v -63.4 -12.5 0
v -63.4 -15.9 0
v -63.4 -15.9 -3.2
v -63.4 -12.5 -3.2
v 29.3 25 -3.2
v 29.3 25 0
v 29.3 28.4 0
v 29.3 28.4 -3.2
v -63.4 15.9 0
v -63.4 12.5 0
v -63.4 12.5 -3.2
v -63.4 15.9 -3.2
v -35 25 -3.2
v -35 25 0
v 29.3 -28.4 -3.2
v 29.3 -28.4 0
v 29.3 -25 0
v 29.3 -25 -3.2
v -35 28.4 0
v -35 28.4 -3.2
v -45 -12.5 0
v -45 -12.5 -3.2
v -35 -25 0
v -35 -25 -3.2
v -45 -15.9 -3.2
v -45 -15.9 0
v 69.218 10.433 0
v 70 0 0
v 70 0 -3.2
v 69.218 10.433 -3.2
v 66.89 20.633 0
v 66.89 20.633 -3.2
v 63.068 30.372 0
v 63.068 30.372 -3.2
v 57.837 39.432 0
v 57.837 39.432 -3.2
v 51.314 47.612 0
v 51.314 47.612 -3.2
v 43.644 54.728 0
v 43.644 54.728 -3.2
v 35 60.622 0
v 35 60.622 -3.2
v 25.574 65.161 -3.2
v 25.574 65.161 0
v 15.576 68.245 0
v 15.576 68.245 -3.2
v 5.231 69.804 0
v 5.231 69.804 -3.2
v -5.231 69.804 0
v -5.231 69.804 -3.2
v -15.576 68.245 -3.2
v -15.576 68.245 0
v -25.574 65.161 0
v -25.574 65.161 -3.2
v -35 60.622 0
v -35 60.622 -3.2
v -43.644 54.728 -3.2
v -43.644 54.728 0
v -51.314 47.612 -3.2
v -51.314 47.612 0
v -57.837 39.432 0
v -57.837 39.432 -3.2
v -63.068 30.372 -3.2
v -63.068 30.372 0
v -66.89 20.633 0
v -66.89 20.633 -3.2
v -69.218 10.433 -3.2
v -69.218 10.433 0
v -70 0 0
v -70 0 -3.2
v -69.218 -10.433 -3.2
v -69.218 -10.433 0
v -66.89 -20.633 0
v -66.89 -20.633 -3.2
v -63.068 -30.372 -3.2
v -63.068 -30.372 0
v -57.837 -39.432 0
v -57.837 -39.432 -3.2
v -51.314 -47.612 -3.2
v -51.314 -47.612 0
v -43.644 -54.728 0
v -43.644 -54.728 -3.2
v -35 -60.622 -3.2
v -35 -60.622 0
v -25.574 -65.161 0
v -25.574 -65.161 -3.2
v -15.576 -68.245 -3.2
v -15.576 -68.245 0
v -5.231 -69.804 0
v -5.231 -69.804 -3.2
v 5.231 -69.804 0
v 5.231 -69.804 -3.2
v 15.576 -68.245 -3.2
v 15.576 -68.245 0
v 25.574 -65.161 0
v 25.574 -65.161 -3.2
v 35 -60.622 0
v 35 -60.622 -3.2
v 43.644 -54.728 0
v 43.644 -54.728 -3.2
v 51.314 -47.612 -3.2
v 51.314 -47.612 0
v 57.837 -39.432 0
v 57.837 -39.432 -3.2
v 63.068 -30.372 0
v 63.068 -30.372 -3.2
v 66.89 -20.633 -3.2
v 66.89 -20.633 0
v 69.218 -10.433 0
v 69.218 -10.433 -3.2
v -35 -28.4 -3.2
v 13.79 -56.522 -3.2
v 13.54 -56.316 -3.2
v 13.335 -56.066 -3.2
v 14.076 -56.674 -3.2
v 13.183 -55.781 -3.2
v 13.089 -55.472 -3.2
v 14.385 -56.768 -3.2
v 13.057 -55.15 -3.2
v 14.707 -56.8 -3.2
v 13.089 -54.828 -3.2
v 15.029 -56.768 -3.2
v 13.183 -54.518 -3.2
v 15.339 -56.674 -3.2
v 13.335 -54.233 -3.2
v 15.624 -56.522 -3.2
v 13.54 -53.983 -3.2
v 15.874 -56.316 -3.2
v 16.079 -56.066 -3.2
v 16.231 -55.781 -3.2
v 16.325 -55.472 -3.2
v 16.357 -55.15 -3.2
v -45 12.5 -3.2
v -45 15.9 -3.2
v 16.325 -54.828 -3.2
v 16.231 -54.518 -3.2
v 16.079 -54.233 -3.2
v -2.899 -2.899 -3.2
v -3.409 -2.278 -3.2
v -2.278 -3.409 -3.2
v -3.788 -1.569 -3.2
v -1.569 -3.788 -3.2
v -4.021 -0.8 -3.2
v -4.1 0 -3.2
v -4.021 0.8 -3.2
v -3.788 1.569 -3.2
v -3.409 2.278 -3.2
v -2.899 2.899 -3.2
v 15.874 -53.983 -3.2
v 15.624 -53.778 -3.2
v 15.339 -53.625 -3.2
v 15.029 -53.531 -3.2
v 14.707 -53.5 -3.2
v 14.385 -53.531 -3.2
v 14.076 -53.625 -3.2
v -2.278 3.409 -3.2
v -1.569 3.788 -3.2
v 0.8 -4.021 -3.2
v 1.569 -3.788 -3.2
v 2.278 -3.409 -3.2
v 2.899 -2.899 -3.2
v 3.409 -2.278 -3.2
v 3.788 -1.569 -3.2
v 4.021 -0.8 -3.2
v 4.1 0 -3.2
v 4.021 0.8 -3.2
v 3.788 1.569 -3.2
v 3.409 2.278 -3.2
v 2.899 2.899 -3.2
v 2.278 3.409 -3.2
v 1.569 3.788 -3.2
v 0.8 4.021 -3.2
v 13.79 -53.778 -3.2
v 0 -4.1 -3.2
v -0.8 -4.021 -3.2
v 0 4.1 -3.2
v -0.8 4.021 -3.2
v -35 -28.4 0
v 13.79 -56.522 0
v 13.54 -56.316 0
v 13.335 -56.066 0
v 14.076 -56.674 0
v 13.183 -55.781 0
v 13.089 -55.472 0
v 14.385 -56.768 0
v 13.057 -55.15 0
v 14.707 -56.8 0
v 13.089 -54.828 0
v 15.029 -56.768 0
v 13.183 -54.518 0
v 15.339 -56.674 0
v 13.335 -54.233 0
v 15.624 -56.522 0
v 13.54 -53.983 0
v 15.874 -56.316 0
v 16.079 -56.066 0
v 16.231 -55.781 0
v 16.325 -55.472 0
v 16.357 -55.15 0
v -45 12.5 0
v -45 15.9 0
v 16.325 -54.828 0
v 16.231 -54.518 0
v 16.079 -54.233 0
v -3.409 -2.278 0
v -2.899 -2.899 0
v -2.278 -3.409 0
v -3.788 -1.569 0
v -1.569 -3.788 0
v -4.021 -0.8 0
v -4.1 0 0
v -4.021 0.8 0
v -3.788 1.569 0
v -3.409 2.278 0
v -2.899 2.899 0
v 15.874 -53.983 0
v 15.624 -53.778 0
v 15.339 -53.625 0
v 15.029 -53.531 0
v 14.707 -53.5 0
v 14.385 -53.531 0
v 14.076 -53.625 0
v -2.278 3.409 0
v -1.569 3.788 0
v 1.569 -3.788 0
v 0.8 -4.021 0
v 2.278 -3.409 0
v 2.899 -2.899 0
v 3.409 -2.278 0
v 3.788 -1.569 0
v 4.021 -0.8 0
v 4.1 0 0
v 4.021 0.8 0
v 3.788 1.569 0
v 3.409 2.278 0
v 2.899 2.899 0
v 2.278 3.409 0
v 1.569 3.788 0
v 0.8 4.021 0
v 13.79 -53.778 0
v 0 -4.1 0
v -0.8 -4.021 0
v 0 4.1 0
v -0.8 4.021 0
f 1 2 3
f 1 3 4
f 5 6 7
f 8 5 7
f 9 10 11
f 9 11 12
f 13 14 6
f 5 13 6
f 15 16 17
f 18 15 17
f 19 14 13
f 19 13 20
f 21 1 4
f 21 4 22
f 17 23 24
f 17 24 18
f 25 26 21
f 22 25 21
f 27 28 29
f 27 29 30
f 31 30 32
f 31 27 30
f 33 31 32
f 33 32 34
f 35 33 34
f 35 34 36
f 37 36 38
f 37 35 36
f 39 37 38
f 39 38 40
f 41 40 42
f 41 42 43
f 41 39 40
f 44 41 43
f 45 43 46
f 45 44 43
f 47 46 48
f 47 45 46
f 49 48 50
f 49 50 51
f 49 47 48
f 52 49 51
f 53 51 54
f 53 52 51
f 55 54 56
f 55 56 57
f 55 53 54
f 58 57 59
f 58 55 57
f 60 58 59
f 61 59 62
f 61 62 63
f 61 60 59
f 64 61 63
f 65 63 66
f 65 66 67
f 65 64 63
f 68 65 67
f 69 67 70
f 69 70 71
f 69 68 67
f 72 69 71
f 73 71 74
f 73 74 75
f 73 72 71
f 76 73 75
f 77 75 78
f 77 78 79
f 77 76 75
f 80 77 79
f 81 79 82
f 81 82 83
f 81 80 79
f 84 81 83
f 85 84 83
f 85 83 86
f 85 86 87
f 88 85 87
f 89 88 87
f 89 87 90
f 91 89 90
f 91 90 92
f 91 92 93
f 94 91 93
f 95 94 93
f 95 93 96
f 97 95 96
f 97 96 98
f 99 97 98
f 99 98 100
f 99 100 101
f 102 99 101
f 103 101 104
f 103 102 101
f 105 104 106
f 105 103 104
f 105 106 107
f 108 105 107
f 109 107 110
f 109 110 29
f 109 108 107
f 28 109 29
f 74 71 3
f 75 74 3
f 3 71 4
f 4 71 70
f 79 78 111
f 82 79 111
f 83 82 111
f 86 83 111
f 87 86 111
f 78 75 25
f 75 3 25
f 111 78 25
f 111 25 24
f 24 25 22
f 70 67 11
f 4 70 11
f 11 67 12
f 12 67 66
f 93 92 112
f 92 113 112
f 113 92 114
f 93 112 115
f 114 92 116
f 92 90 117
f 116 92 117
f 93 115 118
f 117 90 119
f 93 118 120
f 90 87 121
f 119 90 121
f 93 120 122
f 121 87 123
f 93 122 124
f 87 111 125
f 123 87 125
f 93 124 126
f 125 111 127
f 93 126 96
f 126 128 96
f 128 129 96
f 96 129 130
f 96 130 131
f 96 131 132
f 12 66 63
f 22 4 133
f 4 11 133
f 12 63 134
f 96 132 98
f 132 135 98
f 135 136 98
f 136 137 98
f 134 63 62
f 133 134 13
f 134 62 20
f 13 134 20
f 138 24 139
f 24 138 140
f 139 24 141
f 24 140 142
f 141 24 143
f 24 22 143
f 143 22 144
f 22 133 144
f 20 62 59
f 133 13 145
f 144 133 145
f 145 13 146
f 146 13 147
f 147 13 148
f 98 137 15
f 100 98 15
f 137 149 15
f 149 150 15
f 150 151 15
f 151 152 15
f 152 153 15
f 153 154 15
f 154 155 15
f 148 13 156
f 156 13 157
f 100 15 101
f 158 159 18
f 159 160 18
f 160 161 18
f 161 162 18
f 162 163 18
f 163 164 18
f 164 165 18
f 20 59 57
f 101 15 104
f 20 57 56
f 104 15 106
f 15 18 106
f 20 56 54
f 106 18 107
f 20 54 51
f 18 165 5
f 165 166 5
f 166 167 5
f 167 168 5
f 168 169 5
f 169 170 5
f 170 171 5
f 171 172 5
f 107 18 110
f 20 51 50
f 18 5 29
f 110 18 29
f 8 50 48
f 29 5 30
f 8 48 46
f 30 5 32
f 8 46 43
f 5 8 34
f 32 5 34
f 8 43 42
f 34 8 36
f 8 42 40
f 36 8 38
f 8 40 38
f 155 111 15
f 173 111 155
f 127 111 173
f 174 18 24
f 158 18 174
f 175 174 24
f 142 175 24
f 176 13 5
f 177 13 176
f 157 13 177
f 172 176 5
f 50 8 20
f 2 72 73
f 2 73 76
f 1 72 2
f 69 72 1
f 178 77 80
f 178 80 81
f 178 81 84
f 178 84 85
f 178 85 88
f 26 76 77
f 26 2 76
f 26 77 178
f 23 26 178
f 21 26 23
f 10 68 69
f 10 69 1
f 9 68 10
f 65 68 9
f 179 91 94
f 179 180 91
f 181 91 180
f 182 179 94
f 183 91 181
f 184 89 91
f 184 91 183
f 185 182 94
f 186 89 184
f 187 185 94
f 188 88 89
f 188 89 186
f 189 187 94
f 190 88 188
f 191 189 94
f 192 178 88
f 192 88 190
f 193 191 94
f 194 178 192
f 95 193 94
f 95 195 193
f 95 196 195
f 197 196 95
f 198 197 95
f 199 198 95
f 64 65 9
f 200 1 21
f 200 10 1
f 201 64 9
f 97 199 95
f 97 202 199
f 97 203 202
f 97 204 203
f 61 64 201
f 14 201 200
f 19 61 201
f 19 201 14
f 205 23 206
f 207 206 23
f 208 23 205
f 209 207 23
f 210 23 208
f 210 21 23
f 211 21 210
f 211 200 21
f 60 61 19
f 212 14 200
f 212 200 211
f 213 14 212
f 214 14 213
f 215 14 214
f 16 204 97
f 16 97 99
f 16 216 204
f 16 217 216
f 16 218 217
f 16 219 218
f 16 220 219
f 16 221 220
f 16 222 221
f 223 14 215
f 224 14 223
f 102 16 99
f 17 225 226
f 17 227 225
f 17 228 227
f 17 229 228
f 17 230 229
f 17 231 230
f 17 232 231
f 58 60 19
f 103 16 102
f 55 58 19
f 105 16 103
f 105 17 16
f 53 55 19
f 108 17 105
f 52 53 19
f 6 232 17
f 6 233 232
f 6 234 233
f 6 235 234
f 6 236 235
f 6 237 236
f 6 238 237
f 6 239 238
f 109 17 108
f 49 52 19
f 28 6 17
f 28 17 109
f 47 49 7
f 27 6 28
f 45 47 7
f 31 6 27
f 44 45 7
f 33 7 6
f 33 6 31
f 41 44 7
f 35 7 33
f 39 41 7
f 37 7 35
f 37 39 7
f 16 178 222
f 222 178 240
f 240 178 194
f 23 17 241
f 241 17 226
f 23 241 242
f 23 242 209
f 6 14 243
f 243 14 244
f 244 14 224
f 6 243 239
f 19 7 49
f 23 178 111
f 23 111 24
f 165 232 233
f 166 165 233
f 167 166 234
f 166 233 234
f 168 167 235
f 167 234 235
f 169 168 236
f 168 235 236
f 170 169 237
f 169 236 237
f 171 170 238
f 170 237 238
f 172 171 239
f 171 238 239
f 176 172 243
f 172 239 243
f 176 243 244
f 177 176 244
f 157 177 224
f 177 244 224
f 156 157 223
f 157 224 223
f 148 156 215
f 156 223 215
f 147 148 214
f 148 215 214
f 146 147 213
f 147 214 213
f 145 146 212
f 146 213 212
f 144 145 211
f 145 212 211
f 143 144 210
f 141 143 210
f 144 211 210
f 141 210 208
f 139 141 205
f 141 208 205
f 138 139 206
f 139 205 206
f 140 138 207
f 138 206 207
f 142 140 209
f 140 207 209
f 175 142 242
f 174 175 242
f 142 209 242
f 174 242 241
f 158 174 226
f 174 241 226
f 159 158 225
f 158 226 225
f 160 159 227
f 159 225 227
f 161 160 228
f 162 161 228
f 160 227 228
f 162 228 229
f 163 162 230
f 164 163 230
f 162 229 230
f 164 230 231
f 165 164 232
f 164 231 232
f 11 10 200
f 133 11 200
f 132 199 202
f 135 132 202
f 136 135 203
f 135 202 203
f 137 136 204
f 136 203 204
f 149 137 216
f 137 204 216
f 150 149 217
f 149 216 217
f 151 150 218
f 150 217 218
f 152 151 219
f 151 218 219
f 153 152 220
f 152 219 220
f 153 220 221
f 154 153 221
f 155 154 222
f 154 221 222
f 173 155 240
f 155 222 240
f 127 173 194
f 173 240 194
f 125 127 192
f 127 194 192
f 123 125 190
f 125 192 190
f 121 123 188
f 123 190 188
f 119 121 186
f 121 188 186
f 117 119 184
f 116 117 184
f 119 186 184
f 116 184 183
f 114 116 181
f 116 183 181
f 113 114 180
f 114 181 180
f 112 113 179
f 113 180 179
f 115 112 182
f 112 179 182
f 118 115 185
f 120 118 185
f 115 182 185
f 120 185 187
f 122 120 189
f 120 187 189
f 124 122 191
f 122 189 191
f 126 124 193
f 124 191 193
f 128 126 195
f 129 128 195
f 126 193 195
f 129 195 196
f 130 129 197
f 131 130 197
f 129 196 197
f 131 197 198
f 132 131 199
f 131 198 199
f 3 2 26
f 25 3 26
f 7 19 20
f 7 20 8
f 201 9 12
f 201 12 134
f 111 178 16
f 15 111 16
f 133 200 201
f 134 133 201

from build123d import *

# Parameters (mm, degrees)
F0_R     = 70
F0_W     = 18.4
F0_H     = 3.4
F0_W_2   = 64.3
F0_R_2   = 4.1
F1_DEPTH = 3.2
F2_R     = 1.65
F3_DEPTH = 3.2


with BuildPart() as f1:
    # F0 (on Top) → F1 (new body)
    with BuildSketch(Plane.XY):
        Circle(F0_R)
        with Locations((-54.2, -14.2)):
            Rectangle(F0_W, F0_H, mode=Mode.SUBTRACT)
        with Locations((-2.85, -26.7)):
            Rectangle(F0_W_2, F0_H, mode=Mode.SUBTRACT)
        with Locations((-54.2, 14.2)):
            Rectangle(F0_W, F0_H, mode=Mode.SUBTRACT)
        with Locations((-2.85, 26.7)):
            Rectangle(F0_W_2, F0_H, mode=Mode.SUBTRACT)
        Circle(F0_R_2, mode=Mode.SUBTRACT)
    extrude(amount=-F1_DEPTH)

    # F2 (on Top) → F3 (cut)
    with BuildSketch(Plane.XY):
        with Locations((14.707094, -55.149738)):
            Circle(F2_R)
    extrude(amount=-F3_DEPTH, mode=Mode.SUBTRACT)


solid = f1.part
